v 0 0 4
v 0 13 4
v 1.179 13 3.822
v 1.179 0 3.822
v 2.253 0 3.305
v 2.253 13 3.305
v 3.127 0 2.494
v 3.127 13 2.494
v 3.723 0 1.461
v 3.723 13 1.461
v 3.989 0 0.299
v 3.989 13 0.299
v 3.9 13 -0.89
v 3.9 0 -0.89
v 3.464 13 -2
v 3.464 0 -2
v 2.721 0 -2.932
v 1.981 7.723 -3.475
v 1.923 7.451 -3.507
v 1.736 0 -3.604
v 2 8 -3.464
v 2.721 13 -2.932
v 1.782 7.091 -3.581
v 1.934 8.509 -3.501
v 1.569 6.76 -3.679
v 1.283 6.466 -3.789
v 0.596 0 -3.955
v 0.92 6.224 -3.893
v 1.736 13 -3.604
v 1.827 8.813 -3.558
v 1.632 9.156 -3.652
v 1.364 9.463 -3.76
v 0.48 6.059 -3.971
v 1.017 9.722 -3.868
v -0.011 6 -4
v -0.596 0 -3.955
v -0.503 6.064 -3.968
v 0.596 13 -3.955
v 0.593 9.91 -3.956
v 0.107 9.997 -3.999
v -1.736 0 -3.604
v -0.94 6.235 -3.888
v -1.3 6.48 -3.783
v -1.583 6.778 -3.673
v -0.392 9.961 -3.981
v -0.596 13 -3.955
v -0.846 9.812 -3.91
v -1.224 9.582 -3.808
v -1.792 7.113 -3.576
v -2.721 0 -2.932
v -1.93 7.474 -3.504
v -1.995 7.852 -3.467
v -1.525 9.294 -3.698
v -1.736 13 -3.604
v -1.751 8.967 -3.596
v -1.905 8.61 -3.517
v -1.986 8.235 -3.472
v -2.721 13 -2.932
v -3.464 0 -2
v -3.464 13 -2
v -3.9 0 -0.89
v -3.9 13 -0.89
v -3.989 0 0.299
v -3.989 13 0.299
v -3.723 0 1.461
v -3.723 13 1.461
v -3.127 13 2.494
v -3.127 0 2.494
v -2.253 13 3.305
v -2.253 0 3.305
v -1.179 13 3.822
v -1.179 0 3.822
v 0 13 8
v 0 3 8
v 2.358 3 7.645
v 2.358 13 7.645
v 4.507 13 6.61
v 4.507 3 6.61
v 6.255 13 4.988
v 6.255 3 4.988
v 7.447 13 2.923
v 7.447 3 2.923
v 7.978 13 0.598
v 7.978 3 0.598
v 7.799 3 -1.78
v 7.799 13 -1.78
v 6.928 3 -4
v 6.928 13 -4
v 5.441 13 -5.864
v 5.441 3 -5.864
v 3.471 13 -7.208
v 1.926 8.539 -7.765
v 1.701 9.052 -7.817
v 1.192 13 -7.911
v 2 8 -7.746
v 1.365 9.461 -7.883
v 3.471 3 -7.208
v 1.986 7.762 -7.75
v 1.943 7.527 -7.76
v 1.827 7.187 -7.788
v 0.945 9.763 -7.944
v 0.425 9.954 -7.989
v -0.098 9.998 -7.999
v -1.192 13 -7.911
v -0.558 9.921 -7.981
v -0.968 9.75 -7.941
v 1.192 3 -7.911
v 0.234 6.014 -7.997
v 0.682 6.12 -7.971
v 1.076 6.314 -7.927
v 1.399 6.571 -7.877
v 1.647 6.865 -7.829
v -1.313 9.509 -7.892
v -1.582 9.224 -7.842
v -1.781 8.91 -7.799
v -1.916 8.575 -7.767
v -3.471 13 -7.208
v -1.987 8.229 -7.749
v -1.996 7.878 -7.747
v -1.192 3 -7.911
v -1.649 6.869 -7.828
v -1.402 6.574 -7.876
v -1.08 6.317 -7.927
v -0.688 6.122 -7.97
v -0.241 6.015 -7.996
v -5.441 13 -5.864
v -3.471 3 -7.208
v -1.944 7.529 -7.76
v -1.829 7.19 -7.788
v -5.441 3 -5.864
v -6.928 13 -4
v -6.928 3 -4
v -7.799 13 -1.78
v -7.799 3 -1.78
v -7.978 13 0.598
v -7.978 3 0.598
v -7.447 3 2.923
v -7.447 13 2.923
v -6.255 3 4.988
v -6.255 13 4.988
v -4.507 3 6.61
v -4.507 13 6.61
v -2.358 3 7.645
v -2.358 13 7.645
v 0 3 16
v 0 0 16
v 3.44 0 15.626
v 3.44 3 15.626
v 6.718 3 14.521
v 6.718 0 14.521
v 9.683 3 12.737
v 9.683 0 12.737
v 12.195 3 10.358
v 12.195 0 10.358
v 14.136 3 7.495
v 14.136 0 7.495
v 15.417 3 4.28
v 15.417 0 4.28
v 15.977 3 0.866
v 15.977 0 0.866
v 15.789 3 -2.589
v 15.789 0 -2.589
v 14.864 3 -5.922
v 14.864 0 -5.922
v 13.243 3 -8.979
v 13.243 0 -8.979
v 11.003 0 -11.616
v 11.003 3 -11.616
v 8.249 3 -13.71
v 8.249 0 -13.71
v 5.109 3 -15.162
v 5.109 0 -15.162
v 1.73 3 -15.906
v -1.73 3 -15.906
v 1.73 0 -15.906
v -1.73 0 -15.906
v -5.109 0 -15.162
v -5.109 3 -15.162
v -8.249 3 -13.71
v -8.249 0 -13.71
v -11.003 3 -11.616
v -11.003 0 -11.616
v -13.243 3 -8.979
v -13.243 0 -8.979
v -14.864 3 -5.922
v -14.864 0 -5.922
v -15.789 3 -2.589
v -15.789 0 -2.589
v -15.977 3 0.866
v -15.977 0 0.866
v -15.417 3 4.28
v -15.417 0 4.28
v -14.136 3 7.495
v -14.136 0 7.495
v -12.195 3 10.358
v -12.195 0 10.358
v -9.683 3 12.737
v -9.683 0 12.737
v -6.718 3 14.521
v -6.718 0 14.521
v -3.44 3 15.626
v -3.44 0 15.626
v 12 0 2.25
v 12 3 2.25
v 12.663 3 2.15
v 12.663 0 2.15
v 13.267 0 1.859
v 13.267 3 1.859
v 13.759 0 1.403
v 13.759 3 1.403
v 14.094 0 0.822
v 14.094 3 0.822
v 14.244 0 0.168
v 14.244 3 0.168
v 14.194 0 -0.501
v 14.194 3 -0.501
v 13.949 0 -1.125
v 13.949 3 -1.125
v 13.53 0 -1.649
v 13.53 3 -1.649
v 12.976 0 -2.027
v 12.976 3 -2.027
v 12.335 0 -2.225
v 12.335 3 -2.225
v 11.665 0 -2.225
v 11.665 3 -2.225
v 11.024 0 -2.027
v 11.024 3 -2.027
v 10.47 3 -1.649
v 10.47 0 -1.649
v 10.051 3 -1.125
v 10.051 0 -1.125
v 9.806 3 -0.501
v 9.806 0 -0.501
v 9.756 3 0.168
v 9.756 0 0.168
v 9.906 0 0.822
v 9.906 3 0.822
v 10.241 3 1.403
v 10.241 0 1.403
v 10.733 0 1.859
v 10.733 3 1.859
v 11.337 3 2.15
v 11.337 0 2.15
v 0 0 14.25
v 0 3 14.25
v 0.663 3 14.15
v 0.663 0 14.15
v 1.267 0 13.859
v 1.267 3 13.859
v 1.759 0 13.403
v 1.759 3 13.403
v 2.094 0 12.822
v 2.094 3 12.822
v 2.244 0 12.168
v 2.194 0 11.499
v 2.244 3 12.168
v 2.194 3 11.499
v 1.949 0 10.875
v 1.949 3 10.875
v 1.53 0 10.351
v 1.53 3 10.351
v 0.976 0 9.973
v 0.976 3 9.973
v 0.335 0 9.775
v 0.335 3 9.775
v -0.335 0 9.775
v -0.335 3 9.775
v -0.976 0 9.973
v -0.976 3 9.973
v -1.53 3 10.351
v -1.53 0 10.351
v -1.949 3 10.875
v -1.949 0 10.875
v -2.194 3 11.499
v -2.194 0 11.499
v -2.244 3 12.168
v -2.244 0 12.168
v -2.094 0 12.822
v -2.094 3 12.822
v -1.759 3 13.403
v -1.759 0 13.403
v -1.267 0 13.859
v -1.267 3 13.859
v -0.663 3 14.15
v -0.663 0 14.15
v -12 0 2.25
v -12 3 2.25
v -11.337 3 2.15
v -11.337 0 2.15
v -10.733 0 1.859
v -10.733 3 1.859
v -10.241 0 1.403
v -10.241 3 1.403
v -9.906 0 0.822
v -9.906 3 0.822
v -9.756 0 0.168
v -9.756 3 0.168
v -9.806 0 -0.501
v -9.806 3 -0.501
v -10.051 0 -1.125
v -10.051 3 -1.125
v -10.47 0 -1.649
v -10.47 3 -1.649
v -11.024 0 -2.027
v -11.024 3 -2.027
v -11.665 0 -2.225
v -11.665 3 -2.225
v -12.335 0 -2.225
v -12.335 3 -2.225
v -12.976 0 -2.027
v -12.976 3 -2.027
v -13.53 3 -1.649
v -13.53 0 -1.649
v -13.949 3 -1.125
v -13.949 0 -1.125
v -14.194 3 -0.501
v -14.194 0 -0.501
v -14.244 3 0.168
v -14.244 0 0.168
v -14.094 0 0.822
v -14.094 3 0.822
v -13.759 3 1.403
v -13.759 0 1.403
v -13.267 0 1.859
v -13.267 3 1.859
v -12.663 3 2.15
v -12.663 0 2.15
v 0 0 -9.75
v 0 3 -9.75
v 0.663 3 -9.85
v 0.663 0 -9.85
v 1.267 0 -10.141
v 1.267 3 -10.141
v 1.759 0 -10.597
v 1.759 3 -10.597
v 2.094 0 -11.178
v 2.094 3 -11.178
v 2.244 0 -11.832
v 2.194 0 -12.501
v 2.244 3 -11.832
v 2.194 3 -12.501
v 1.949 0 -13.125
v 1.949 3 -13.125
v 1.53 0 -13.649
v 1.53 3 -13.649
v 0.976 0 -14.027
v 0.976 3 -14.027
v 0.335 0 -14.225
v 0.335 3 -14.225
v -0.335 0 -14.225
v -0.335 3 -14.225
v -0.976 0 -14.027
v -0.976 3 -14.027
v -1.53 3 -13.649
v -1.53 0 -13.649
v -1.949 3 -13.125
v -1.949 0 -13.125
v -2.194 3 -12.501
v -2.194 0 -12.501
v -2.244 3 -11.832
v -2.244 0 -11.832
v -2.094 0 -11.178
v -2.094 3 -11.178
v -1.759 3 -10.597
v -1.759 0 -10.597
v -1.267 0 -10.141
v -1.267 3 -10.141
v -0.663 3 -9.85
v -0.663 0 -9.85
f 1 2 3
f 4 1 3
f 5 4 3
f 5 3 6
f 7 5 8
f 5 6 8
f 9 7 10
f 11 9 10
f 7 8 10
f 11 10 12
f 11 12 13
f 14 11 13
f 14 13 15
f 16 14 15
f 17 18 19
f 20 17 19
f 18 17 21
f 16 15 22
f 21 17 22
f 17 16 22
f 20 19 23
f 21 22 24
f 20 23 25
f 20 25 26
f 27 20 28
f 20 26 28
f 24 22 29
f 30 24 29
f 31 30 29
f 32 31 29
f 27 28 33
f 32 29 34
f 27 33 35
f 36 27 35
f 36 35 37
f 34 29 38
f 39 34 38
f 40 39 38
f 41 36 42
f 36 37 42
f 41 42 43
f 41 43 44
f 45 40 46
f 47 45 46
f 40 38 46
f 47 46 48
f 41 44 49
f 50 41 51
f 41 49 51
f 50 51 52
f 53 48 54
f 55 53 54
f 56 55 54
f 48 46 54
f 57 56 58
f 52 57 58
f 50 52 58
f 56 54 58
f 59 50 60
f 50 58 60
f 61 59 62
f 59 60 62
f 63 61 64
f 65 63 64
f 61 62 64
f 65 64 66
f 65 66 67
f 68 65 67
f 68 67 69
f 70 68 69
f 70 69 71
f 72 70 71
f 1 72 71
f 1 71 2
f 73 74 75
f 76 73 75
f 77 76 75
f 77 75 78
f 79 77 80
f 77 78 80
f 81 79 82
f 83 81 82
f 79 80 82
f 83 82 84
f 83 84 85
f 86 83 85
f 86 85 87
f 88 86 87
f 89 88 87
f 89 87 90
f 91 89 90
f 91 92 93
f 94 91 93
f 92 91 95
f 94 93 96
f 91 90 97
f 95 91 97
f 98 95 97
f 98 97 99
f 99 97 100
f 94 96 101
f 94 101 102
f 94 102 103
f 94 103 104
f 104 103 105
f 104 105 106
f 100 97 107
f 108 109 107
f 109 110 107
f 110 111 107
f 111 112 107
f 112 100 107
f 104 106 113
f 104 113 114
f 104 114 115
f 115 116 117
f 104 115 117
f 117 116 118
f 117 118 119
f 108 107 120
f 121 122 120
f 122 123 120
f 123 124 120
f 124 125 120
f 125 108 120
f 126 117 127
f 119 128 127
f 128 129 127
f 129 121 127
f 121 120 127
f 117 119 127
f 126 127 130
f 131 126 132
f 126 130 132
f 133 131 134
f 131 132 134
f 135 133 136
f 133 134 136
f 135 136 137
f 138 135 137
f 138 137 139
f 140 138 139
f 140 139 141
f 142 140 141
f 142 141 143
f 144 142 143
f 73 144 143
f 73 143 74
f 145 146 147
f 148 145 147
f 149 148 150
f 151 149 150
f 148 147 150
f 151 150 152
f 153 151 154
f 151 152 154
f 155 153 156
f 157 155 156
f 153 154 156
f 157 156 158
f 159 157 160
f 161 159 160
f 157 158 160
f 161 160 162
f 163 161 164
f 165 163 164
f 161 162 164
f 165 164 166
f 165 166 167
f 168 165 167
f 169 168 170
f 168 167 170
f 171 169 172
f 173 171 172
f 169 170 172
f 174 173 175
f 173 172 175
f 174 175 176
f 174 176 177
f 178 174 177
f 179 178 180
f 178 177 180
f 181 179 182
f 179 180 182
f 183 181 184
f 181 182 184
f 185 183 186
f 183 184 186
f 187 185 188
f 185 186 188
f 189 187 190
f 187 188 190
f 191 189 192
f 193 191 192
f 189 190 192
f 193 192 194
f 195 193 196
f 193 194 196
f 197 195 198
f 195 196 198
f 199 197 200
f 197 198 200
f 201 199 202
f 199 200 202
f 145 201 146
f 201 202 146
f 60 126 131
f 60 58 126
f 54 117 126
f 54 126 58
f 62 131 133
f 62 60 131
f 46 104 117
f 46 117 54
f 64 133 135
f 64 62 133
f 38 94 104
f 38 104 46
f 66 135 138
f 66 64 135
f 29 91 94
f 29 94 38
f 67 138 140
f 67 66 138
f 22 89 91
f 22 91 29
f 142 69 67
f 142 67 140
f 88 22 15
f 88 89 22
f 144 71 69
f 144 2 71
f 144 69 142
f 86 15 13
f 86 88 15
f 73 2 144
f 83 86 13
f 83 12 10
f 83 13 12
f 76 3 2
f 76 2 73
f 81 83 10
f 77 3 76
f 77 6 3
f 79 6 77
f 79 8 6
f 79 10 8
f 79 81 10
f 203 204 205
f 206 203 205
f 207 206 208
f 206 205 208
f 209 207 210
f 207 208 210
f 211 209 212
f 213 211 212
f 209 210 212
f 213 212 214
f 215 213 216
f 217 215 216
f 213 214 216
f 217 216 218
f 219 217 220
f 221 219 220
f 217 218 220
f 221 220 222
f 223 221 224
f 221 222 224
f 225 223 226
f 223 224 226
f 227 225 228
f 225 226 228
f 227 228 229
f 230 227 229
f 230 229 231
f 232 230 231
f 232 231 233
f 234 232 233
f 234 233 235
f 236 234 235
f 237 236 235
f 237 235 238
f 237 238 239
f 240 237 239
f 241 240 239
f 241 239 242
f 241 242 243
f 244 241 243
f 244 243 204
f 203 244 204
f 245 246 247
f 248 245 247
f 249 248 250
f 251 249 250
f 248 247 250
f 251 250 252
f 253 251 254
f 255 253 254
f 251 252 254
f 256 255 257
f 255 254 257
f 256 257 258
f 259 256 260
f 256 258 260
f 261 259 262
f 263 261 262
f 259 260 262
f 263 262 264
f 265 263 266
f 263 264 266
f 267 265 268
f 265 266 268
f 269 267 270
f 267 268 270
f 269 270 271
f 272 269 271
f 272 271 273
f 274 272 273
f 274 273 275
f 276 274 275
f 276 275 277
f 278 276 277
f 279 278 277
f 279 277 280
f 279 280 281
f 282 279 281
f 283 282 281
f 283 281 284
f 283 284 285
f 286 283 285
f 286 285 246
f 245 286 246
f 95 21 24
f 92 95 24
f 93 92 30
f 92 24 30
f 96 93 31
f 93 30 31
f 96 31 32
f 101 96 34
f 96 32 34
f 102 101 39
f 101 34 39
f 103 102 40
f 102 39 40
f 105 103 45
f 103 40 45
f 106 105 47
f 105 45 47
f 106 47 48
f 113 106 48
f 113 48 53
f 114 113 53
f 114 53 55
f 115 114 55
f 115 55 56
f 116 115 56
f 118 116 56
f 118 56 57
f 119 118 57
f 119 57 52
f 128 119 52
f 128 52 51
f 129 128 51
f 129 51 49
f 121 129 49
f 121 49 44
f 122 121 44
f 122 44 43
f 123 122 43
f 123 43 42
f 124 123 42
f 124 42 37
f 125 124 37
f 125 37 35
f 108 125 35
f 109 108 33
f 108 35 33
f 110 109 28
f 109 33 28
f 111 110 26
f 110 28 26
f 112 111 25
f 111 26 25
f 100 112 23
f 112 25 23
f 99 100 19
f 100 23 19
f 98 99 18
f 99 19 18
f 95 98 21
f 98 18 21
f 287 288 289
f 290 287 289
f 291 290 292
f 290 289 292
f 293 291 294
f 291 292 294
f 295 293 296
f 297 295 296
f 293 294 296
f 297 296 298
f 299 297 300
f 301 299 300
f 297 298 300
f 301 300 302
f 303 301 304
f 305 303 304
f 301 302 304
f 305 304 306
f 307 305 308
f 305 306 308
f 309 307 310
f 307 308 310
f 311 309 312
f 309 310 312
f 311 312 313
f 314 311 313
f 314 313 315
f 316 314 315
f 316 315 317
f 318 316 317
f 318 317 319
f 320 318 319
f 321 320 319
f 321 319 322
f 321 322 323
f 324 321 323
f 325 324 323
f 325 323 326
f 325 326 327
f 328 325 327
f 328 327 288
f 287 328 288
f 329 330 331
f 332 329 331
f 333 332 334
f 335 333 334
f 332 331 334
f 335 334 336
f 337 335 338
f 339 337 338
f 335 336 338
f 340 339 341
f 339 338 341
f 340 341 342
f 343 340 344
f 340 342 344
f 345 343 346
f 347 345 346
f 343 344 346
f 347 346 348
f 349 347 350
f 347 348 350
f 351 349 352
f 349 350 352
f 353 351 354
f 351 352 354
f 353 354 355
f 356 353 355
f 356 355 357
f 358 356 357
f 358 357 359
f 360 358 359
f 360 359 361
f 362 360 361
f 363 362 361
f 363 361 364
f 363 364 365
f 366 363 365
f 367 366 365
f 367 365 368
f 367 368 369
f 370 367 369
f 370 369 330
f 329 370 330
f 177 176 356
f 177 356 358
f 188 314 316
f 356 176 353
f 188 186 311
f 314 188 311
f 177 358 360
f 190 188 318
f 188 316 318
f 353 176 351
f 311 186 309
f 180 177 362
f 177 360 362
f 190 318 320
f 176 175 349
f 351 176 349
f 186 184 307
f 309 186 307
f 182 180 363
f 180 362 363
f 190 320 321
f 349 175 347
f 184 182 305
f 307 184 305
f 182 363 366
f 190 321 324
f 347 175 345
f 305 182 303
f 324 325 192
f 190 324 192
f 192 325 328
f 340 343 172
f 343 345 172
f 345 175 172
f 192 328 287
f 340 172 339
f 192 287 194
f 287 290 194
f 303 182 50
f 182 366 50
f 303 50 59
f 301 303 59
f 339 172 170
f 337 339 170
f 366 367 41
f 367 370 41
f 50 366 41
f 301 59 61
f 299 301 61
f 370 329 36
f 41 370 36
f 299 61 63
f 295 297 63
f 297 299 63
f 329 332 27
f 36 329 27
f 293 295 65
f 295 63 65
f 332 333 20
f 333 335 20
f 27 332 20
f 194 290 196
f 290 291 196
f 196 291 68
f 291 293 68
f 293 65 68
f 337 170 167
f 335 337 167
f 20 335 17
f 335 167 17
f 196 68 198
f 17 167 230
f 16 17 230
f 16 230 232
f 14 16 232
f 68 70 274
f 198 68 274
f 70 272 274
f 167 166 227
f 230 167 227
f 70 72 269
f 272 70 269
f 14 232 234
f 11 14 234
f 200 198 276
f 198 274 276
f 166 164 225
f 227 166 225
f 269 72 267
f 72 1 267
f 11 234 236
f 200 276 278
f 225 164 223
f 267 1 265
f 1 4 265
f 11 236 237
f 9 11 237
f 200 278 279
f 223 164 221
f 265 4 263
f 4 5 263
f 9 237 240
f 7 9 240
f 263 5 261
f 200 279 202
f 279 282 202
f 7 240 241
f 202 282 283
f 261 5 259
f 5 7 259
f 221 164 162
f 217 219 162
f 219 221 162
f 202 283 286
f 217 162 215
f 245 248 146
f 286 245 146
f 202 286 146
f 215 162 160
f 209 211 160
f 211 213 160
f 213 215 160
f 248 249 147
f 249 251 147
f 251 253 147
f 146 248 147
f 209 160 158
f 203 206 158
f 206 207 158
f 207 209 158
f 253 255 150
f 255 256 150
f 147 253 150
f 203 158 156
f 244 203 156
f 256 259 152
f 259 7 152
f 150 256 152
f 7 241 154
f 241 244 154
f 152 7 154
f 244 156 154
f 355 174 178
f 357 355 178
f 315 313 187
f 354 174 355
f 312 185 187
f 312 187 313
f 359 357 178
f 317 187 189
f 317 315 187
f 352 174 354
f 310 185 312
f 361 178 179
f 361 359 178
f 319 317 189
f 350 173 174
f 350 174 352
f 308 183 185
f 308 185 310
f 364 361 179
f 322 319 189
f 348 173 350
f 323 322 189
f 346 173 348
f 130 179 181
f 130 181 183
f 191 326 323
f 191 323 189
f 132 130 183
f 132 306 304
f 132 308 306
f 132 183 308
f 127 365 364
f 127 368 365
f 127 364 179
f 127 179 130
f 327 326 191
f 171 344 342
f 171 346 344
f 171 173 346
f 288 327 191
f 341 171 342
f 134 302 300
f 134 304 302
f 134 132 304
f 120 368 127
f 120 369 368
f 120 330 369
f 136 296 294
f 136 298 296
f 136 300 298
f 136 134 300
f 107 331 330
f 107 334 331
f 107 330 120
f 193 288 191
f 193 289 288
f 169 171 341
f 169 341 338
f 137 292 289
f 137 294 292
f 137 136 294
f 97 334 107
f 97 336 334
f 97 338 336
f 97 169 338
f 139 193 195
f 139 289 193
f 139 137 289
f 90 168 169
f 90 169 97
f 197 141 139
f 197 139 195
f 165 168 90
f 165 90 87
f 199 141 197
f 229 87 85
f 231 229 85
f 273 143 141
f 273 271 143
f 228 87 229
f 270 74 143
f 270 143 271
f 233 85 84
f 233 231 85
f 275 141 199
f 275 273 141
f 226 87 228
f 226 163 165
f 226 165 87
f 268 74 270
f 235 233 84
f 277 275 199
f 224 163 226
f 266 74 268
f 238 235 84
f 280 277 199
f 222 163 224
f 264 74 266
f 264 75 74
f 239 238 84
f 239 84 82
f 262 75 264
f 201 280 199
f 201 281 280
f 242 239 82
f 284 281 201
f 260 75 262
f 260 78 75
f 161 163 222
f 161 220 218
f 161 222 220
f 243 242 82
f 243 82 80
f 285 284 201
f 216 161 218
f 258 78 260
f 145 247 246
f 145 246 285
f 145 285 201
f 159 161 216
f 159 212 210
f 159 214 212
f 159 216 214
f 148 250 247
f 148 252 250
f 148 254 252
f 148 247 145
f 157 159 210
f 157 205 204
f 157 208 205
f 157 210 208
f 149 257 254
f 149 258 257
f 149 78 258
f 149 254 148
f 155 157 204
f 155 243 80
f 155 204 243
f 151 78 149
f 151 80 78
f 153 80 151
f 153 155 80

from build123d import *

# Parameters (mm, degrees)
SKETCH1_R               = 16
BOSS_EXTRUDE1_DEPTH     = 3
SKETCH2_R               = 8
BOSS_EXTRUDE2_DEPTH     = 10
CUT_EXTRUDE1_REACH      = 28.096
SKETCH3_R               = 4
CUT_EXTRUDE2_REACH      = 26.739
SKETCH4_R               = 2.25
CUT_EXTRUDE3_REACH      = 28.096
CUT_EXTRUDE3_END_RADIUS = 8
SKETCH5_R               = 2


with BuildPart() as part:
    # Sketch1 → Boss-Extrude1 (new body)
    with BuildSketch(Plane(origin=(0, 0, 0), x_dir=(1, 0, 0), z_dir=(0, 1, 0))):
        with Locations(Location((0, 0, 0), (0, 0, 270))):
            Circle(SKETCH1_R)
    extrude(amount=BOSS_EXTRUDE1_DEPTH)

    # Sketch2 → Boss-Extrude2 (add)
    with BuildSketch(Plane(origin=(0, 3, 0), x_dir=(1, 0, 0), z_dir=(0, 1, 0))):
        with Locations(Location((0, 0, 0), (0, 0, 270))):
            Circle(SKETCH2_R)
    extrude(amount=BOSS_EXTRUDE2_DEPTH)

    # Sketch3 → Cut-Extrude1 (cut, up to next)
    with BuildSketch(Plane(origin=(0, 13, 0), x_dir=(1, 0, 0), z_dir=(0, 1, 0)), mode=Mode.PRIVATE) as cut_extrude1_sk1:
        with Locations(Location((0, 0, 0), (0, 0, 270))):
            Circle(SKETCH3_R)
    cut_extrude1_tool1 = extrude(cut_extrude1_sk1.sketch, amount=-CUT_EXTRUDE1_REACH, mode=Mode.PRIVATE) & part.part
    add(cut_extrude1_tool1.solids().sort_by_distance((0, 13, 0))[0], mode=Mode.SUBTRACT)

    # Sketch4 → Cut-Extrude2 (cut, up to next)
    with BuildSketch(Plane(origin=(0, 3, 0), x_dir=(1, 0, 0), z_dir=(0, 1, 0)), mode=Mode.PRIVATE) as cut_extrude2_sk1:
        with Locations(Location((0, 12, 0), (0, 0, 270))):
            Circle(SKETCH4_R)
    cut_extrude2_tool1 = extrude(cut_extrude2_sk1.sketch, amount=-CUT_EXTRUDE2_REACH, mode=Mode.PRIVATE) & part.part
    # Sketch4 → Cut-Extrude2 (cut, up to next)
    with BuildSketch(Plane(origin=(0, 3, 0), x_dir=(1, 0, 0), z_dir=(0, 1, 0)), mode=Mode.PRIVATE) as cut_extrude2_sk2:
        with Locations(Location((12, 0, 0), (0, 0, 270))):
            Circle(SKETCH4_R)
    cut_extrude2_tool2 = extrude(cut_extrude2_sk2.sketch, amount=-CUT_EXTRUDE2_REACH, mode=Mode.PRIVATE) & part.part
    # Sketch4 → Cut-Extrude2 (cut, up to next)
    with BuildSketch(Plane(origin=(0, 3, 0), x_dir=(1, 0, 0), z_dir=(0, 1, 0)), mode=Mode.PRIVATE) as cut_extrude2_sk3:
        with Locations(Location((0, -12, 0), (0, 0, 270))):
            Circle(SKETCH4_R)
    cut_extrude2_tool3 = extrude(cut_extrude2_sk3.sketch, amount=-CUT_EXTRUDE2_REACH, mode=Mode.PRIVATE) & part.part
    # Sketch4 → Cut-Extrude2 (cut, up to next)
    with BuildSketch(Plane(origin=(0, 3, 0), x_dir=(1, 0, 0), z_dir=(0, 1, 0)), mode=Mode.PRIVATE) as cut_extrude2_sk4:
        with Locations(Location((-12, 0, 0), (0, 0, 270))):
            Circle(SKETCH4_R)
    cut_extrude2_tool4 = extrude(cut_extrude2_sk4.sketch, amount=-CUT_EXTRUDE2_REACH, mode=Mode.PRIVATE) & part.part
    add(cut_extrude2_tool1.solids().sort_by_distance((0, 3, -12))[0], mode=Mode.SUBTRACT)
    add(cut_extrude2_tool2.solids().sort_by_distance((12, 3, 0))[0], mode=Mode.SUBTRACT)
    add(cut_extrude2_tool3.solids().sort_by_distance((0, 3, 12))[0], mode=Mode.SUBTRACT)
    add(cut_extrude2_tool4.solids().sort_by_distance((-12, 3, 0))[0], mode=Mode.SUBTRACT)

    # Cut-Extrude3: up to this cylinder (the profile starts inside it)
    cut_extrude3_end = Plane(origin=(0, 8, 0), z_dir=(0, -1, 0)) * Cylinder(CUT_EXTRUDE3_END_RADIUS, 73.192, mode=Mode.PRIVATE)
    # Sketch5 → Cut-Extrude3 (cut, up to the surface)
    with BuildSketch(Plane.XY, mode=Mode.PRIVATE) as cut_extrude3_sk1:
        with Locations((0, 8)):
            Circle(SKETCH5_R)
    cut_extrude3_tool1 = extrude(cut_extrude3_sk1.sketch, amount=-CUT_EXTRUDE3_REACH, mode=Mode.PRIVATE) & cut_extrude3_end
    add(cut_extrude3_tool1.solids().sort_by_distance((0, 8, 0))[0], mode=Mode.SUBTRACT)


solid = part.part
